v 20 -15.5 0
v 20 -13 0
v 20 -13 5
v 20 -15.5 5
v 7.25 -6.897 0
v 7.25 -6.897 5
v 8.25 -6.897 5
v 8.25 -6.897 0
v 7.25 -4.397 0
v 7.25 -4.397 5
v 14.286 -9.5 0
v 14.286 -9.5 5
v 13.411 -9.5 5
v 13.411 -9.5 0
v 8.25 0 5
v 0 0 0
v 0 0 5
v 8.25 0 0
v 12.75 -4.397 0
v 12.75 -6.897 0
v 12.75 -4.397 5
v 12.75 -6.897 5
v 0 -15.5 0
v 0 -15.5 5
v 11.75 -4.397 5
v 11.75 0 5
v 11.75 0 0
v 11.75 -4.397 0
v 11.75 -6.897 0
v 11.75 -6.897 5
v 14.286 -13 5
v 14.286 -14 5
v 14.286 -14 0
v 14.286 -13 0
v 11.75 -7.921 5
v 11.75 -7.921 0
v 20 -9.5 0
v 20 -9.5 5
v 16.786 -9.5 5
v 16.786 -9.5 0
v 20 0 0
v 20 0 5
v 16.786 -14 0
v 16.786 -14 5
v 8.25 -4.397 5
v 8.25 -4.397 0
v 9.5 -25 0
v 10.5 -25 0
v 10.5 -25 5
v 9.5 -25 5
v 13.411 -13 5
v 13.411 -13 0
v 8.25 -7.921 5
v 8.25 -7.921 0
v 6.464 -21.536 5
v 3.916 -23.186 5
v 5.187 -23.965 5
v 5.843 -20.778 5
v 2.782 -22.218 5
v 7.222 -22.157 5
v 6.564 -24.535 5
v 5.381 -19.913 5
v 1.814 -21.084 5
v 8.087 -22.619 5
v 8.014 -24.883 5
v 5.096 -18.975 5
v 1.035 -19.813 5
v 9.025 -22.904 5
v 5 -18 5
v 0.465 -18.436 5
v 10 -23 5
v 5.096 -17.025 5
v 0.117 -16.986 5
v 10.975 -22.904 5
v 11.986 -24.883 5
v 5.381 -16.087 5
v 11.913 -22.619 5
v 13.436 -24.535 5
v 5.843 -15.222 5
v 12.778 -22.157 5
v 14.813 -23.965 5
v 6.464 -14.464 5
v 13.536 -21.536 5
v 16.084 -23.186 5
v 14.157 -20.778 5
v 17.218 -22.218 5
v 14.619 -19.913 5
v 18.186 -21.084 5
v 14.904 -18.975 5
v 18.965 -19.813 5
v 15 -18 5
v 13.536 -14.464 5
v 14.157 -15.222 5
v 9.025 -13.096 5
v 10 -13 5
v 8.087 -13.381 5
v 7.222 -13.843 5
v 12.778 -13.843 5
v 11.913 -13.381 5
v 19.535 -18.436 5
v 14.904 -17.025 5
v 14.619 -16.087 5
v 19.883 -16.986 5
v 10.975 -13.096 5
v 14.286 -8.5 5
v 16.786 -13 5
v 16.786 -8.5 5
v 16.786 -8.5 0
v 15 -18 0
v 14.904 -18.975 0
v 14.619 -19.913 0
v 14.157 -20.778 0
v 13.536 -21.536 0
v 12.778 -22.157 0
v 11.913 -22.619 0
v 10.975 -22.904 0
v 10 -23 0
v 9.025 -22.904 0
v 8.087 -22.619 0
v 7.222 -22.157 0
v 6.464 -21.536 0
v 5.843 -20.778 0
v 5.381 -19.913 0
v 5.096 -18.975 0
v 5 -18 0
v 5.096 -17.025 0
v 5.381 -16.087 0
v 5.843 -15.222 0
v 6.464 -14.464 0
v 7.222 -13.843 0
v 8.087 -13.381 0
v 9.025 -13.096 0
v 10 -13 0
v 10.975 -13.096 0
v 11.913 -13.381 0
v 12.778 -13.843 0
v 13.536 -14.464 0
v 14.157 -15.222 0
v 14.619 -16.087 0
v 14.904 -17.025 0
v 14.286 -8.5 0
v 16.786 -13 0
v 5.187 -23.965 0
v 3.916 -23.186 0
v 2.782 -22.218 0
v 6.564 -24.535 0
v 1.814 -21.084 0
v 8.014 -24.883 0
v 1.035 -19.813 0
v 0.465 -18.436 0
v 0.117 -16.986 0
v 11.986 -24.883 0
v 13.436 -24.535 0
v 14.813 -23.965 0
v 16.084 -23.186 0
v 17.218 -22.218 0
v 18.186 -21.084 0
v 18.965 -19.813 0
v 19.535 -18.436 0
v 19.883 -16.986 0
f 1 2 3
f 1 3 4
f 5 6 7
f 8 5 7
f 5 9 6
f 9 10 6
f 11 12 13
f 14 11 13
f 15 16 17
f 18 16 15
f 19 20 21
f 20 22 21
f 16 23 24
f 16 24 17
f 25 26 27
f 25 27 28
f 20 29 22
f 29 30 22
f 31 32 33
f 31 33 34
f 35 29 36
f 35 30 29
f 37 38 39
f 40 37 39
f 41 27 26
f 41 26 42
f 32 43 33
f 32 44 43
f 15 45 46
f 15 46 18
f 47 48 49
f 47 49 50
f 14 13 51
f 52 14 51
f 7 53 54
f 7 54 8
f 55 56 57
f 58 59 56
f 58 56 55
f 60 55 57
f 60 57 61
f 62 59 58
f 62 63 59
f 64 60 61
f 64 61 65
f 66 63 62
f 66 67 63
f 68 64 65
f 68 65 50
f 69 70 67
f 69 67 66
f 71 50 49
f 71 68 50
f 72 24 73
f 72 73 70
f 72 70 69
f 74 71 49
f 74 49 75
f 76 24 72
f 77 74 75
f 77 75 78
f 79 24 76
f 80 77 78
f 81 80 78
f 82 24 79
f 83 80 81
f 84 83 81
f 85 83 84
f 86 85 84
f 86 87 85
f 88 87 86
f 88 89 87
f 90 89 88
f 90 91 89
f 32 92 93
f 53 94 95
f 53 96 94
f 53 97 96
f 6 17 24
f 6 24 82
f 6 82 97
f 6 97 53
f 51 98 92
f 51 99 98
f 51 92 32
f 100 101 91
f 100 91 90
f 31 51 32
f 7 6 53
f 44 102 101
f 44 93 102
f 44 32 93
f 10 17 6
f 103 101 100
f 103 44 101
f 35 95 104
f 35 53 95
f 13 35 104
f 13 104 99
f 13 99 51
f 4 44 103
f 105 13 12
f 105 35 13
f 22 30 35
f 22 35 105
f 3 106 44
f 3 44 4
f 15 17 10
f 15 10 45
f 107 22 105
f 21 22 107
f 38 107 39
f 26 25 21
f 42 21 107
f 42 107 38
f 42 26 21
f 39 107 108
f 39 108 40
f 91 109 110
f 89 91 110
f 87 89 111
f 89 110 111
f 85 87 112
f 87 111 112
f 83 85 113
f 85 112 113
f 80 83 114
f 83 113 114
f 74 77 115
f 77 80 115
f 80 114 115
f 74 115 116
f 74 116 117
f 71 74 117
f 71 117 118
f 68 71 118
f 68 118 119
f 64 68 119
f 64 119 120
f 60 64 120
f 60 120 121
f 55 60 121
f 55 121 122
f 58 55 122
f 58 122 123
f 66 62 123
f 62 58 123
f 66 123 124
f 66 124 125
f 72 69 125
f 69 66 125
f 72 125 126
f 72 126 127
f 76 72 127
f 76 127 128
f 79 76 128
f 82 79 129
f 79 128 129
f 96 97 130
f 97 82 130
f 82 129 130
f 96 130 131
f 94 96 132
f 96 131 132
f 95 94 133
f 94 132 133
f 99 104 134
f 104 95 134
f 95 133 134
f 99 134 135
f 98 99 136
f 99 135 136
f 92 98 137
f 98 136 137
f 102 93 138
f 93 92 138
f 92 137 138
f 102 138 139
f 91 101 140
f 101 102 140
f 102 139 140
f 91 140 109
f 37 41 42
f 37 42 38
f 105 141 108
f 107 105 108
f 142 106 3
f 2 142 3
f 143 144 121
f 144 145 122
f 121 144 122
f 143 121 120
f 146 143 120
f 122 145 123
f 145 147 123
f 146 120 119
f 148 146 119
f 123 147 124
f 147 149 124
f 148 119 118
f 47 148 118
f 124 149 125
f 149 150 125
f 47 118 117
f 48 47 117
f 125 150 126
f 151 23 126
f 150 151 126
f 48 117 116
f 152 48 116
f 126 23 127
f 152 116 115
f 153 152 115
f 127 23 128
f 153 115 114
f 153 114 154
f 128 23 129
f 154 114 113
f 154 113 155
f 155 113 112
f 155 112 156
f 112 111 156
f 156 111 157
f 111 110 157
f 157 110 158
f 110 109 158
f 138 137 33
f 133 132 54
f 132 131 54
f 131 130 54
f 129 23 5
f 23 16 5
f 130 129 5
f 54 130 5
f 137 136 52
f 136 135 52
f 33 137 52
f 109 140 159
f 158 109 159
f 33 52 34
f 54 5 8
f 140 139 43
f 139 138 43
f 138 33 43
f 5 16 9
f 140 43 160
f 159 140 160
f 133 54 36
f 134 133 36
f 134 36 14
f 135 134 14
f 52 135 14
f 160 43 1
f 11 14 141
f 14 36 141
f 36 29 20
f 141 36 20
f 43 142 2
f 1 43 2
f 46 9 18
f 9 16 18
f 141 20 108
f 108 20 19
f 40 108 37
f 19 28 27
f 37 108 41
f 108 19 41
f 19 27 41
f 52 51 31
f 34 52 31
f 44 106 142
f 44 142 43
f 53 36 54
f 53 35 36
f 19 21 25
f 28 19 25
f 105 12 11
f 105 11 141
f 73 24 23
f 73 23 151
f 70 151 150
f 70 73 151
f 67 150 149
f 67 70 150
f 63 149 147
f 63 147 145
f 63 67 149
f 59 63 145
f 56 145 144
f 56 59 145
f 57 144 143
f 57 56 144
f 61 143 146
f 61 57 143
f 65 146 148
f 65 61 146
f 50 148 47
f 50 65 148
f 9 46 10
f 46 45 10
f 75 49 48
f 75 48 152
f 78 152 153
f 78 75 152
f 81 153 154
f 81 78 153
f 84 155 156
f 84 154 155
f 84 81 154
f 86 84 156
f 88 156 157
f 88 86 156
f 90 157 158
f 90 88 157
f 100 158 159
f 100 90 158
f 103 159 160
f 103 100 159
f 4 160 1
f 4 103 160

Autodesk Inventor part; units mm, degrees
ref_plane "YZ Plane" through (0, 0, 0) normal (1, 0, 0) x (0, 1, 0)
ref_plane "XZ Plane" through (0, 0, 0) normal (0, 1, 0) x (-1, 0, 0)
ref_plane "XY Plane" through (0, 0, 0) normal (0, 0, 1) x (1, 0, 0)
sketch "Boceto1" plane through (0, 0, 0) normal (0, 0, 1) x (1, 0, 0)
  line L0 (0, 0) -> (20, 0)
  line L1 (20, 0) -> (20, -25)
  line L2 (20, -25) -> (0, -25)
  line L3 (0, -25) -> (0, 0)
  circle A0 centre (10, -18) radius 5
  dimension "d0" = 20
  dimension "d1" = 25
  dimension "d2" = 7
extrude "Extrusión1" add sketch "Boceto1" along normal blind 5
sketch "Boceto2" plane through (0, 0, 5) normal (0, 0, 1) x (1, 0, 0)
  line L0 (0, 0) -> (20, 0) projected
  line L1 (11.75, -7.9211) -> (8.25, -7.9211)
  line L2 (7.25, -4.3971) -> (7.25, -6.8971)
  line L3 (12.75, -6.8971) -> (12.75, -4.3971)
  line L4 (7.25, -6.8971) -> (8.25, -6.8971)
  line L5 (11.75, -6.8971) -> (12.75, -6.8971)
  line L6 (12.75, -4.3971) -> (11.75, -4.3971)
  line L7 (8.25, -4.3971) -> (7.25, -4.3971)
  line L8 (8.25, -7.9211) -> (8.25, -6.8971)
  line L9 (8.25, -4.3971) -> (8.25, 0)
  line L10 (11.75, 0) -> (11.75, -4.3971)
  line L11 (11.75, -6.8971) -> (11.75, -7.9211)
extrude "Extrusión2" cut sketch "Boceto2" against normal through all
sketch "Boceto3" plane through (0, 0, 5) normal (0, 0, 1) x (1, 0, 0)
  line L0 (20, 0) -> (20, -25) projected
  line L1 (13.4106, -9.5) -> (13.4106, -13)
  line L2 (14.2856, -8.5) -> (16.7856, -8.5)
  line L3 (16.7856, -14) -> (14.2856, -14)
  line L4 (16.7856, -8.5) -> (16.7856, -9.5)
  line L5 (16.7856, -13) -> (16.7856, -14)
  line L6 (14.2856, -14) -> (14.2856, -13)
  line L7 (14.2856, -9.5) -> (14.2856, -8.5)
  line L8 (20, -9.5) -> (16.7856, -9.5)
  line L9 (14.2856, -9.5) -> (13.4106, -9.5)
  line L10 (13.4106, -13) -> (14.2856, -13)
  line L11 (16.7856, -13) -> (20, -13)
  dimension "d12" = 5.5
extrude "Extrusión3" cut sketch "Boceto3" against normal through all
fillet "Empalme1" radius 9.5 2 edges at (0, -25, 2.5) (20, -25, 2.5)
properties part number "soporte polea eje x"
